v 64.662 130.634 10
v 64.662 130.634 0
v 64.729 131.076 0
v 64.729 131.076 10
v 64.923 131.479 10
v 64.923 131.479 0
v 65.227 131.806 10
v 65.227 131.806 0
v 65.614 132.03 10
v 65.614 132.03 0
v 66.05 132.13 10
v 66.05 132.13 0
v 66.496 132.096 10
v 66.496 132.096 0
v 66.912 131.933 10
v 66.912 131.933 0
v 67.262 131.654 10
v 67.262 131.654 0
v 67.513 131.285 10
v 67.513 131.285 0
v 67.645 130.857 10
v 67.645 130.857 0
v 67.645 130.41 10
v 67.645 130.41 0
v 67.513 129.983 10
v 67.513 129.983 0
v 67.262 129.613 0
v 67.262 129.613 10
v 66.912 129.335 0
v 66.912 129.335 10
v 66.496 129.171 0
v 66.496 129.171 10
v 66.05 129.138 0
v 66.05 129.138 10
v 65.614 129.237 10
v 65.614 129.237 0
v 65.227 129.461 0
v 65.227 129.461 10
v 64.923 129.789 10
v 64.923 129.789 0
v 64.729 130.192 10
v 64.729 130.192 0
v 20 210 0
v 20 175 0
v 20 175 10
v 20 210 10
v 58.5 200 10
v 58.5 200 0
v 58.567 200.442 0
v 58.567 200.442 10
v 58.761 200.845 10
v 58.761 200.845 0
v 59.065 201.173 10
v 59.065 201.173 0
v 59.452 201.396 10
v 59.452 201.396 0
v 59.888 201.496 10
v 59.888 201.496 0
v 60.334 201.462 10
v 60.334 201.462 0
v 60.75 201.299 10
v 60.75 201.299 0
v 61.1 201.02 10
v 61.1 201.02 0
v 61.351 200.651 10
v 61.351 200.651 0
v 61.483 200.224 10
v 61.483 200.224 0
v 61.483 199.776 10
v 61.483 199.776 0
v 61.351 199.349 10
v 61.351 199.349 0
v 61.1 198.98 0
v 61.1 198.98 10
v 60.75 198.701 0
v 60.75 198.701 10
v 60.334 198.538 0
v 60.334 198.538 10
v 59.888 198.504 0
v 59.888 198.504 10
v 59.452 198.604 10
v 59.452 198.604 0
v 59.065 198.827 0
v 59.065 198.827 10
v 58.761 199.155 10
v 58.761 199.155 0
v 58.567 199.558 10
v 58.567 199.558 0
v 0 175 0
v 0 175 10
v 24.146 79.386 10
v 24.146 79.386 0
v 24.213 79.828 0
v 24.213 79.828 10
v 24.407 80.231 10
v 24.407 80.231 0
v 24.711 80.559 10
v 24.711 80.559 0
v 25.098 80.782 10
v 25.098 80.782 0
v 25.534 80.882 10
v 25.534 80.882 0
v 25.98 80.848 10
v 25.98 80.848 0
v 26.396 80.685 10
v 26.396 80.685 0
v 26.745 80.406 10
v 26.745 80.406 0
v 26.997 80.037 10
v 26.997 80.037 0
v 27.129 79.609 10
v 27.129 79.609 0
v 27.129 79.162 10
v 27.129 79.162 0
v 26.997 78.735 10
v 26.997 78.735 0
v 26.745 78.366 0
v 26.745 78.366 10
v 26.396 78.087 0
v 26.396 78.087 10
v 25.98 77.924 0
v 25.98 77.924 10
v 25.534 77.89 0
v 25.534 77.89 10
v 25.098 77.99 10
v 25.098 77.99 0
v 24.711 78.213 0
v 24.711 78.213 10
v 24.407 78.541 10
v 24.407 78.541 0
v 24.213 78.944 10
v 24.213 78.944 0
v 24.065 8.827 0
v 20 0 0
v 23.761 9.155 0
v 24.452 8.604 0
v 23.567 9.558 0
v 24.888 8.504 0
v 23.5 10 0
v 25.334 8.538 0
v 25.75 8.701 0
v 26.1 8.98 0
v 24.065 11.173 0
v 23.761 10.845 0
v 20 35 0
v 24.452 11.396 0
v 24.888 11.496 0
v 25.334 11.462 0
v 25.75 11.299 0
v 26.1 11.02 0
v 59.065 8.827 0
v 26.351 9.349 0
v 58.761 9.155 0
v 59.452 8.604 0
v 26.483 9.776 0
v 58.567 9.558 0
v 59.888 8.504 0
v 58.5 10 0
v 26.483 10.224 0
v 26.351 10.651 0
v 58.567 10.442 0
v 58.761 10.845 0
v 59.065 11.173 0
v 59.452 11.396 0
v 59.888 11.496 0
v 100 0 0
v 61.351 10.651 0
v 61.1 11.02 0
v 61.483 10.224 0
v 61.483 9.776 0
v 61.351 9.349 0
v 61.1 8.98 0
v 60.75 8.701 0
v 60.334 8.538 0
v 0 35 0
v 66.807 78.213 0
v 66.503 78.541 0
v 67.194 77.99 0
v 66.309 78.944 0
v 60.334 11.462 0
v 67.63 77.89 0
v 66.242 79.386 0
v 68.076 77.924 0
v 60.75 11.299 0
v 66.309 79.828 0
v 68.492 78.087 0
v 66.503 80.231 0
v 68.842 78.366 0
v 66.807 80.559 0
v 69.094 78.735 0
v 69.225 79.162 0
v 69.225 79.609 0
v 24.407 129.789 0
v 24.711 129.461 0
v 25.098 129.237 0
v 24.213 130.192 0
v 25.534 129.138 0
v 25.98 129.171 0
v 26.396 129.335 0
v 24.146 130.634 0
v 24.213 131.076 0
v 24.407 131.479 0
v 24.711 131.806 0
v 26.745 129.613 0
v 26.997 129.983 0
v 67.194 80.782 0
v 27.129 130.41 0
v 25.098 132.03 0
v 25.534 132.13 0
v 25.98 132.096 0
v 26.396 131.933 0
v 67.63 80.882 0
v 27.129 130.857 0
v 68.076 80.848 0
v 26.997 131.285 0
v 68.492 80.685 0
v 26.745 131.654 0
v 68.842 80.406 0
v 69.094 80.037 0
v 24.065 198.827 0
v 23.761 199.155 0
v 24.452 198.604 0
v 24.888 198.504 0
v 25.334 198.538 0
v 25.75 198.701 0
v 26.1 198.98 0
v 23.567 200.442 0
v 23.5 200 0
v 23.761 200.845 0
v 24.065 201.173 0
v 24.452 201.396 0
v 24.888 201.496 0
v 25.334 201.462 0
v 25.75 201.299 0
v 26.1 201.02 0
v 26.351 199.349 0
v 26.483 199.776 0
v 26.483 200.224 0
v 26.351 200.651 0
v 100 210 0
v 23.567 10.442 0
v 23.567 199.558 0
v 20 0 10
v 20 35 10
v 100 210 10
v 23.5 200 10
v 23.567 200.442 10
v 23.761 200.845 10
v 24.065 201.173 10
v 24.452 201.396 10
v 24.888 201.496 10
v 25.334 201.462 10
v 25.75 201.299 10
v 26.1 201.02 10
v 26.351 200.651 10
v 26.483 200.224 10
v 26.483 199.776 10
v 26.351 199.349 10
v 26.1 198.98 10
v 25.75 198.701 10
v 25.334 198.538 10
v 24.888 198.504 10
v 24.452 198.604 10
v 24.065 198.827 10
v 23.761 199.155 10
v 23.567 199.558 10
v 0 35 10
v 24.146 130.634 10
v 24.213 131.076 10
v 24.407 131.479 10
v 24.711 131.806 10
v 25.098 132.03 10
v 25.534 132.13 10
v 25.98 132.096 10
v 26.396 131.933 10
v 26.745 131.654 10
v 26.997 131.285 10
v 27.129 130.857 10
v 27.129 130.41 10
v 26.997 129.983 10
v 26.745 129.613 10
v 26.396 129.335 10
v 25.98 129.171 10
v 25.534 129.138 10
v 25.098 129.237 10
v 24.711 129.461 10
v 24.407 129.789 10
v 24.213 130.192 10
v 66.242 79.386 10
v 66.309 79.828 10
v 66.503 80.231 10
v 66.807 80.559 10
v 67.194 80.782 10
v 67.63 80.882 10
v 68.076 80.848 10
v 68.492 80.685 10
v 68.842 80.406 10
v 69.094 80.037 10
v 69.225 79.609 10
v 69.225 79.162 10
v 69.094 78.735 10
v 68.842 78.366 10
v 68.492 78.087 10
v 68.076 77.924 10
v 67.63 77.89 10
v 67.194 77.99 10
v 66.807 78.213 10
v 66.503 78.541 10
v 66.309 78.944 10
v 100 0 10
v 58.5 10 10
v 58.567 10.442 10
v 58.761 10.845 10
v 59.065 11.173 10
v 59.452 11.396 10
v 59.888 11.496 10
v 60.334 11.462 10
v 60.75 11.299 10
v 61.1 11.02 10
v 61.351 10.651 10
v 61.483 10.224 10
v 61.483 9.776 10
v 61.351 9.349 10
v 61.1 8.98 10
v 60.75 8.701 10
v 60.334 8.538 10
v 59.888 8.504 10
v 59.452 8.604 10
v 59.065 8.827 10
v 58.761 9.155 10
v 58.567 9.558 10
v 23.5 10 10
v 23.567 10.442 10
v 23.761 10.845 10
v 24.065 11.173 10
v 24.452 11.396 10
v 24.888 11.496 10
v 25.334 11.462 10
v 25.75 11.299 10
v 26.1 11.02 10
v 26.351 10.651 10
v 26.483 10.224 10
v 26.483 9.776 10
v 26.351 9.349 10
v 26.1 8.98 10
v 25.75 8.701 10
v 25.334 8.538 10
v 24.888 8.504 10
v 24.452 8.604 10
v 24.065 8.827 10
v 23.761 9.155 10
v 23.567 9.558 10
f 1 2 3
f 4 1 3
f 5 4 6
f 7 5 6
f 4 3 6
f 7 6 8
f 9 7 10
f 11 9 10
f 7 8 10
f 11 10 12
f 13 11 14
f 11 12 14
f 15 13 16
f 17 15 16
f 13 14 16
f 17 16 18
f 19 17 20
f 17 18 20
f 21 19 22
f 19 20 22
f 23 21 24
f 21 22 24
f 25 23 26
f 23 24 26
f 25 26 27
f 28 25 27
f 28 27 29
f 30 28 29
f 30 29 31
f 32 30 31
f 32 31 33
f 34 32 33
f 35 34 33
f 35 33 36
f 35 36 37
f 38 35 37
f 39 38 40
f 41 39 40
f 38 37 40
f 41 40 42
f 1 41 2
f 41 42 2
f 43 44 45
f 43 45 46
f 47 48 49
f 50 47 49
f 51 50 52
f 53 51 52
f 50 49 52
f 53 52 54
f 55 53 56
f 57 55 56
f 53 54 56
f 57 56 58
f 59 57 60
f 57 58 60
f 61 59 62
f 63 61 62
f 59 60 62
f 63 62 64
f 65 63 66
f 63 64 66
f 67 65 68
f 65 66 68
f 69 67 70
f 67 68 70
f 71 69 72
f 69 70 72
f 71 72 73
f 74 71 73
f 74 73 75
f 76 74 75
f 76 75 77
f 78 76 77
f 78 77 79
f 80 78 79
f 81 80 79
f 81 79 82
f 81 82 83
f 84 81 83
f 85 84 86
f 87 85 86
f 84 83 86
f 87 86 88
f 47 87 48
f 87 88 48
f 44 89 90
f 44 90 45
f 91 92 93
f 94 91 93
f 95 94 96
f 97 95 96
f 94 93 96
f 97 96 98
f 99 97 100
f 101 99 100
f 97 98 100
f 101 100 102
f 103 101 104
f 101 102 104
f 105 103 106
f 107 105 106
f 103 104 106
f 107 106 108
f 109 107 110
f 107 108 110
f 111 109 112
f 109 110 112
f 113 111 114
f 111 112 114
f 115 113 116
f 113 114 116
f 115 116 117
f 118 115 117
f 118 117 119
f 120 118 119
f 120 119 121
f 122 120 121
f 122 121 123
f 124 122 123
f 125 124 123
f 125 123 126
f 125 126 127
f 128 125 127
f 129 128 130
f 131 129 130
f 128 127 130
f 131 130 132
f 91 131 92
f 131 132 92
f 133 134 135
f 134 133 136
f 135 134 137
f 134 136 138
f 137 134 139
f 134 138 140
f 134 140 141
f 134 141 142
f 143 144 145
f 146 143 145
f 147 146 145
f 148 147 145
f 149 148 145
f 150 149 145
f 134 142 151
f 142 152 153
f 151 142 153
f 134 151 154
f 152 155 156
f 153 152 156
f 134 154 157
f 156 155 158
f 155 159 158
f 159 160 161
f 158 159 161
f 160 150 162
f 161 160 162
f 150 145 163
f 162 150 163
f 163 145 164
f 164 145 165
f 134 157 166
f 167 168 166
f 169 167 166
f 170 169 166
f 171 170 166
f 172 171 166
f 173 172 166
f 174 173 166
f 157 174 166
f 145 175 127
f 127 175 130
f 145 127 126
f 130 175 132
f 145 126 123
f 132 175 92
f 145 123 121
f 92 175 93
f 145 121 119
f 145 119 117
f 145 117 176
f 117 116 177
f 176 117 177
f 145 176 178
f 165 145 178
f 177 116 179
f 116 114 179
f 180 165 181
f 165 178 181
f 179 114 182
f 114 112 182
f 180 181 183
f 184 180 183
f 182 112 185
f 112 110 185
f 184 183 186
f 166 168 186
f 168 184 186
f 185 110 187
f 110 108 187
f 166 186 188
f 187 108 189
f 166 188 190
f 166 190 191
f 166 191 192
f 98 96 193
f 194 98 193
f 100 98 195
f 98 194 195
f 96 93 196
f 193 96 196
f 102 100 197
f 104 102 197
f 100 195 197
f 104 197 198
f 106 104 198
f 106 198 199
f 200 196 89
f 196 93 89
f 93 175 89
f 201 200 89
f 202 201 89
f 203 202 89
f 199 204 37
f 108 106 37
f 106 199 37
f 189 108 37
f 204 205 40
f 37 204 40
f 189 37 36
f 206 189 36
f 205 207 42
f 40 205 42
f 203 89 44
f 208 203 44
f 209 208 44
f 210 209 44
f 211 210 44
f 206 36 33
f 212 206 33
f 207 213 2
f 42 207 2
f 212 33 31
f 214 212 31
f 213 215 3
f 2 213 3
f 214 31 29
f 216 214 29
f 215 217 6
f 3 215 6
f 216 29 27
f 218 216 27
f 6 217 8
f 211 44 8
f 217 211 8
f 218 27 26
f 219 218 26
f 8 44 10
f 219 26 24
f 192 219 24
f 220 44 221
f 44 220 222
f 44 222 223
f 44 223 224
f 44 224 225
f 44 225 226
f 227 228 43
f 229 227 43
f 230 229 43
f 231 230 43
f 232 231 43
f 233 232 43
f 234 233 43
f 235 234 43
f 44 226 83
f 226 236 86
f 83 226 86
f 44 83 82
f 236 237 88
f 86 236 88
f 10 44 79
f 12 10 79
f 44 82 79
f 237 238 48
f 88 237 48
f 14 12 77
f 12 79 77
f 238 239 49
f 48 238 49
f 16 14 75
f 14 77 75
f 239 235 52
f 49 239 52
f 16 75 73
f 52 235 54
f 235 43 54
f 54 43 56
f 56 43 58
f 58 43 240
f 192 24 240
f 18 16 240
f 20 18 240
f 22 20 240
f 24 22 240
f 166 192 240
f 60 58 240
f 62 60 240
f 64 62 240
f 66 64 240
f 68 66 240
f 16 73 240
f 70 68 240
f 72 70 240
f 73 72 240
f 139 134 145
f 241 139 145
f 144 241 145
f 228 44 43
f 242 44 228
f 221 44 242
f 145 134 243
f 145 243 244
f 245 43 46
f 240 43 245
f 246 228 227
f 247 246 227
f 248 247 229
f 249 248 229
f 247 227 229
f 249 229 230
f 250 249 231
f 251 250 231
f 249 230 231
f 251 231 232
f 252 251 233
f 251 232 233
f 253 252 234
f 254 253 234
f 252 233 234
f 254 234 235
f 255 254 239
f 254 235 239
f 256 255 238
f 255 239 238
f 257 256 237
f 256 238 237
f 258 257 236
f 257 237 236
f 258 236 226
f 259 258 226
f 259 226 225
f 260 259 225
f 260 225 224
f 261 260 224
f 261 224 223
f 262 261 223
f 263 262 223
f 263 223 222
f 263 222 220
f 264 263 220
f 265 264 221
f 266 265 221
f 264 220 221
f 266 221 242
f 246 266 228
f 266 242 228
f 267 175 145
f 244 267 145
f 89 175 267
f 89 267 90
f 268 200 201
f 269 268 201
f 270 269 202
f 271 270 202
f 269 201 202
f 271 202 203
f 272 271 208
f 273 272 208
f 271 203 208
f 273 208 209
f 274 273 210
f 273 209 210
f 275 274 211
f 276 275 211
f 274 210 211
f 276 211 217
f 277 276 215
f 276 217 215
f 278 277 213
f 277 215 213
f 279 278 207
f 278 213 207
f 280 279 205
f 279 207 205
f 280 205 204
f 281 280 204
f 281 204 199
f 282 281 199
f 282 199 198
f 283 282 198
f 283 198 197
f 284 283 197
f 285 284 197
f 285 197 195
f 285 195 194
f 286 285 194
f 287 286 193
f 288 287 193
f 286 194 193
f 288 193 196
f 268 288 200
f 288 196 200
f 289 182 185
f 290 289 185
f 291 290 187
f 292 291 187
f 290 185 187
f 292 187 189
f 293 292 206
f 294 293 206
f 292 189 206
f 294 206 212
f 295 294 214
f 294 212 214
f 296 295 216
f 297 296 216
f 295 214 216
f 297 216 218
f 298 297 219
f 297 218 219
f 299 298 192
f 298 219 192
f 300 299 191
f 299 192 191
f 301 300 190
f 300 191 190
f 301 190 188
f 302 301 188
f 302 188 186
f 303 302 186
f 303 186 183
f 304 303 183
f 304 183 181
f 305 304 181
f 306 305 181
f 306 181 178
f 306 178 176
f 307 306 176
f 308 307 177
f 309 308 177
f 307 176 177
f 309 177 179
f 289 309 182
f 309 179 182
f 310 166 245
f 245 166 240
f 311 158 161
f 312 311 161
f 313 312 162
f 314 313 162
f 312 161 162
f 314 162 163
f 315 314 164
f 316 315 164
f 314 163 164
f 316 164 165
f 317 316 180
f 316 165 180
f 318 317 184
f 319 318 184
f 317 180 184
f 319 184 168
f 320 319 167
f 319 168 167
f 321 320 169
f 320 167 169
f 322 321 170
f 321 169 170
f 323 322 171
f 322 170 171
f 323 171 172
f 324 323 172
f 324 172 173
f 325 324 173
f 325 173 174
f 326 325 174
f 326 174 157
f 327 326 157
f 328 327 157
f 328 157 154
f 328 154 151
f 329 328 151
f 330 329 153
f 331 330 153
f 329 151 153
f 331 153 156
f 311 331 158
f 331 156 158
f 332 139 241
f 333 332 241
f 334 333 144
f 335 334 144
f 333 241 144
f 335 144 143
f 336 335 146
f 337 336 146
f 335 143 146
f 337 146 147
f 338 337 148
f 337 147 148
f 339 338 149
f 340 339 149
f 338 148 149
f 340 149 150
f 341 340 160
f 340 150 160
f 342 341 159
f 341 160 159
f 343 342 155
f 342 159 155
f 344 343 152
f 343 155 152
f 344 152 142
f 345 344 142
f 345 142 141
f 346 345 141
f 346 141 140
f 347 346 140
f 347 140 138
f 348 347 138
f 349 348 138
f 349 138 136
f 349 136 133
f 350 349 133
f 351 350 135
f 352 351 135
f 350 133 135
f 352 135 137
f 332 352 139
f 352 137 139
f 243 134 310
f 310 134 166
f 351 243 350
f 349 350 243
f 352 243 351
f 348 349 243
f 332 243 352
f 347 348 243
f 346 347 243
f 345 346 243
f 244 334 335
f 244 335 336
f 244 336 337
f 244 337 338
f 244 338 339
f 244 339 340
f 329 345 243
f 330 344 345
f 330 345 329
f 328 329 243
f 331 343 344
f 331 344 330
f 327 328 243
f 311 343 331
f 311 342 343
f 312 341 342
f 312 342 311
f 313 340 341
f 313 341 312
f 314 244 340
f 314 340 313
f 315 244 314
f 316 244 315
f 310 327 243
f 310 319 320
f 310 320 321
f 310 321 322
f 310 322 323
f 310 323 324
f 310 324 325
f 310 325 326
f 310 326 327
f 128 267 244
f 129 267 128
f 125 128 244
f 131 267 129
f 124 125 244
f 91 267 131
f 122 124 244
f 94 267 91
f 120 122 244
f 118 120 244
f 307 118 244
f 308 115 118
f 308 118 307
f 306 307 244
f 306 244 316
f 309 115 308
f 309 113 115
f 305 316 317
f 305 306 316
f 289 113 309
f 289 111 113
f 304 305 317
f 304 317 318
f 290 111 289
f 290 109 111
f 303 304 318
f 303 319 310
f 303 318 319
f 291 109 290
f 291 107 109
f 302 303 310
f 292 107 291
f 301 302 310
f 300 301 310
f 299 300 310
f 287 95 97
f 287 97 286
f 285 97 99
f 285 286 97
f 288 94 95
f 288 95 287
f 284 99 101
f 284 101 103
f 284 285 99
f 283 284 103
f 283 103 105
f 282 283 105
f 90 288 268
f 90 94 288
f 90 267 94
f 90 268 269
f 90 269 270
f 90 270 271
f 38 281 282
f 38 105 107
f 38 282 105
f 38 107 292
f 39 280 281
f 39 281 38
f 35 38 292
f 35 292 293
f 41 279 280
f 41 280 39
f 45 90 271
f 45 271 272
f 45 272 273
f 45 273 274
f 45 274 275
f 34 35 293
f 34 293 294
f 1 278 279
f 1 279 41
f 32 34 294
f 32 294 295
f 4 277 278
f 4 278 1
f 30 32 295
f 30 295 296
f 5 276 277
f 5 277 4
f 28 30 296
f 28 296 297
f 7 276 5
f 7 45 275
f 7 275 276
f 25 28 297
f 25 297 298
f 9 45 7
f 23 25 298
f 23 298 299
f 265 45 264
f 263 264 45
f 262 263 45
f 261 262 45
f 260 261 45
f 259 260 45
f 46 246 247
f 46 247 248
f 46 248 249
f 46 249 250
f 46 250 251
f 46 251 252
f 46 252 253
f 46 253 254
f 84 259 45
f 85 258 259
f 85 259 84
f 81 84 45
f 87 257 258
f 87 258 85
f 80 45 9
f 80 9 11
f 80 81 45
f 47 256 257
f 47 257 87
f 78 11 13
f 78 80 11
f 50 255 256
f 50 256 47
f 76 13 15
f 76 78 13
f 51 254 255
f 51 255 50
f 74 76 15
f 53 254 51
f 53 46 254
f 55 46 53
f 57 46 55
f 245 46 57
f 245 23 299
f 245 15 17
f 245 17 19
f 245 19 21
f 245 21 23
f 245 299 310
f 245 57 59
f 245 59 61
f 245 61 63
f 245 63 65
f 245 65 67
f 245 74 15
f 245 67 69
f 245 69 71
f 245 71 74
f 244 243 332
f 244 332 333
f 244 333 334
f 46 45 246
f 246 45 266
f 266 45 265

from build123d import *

# Parameters (mm, degrees)
ESQUISSE2_W             = 100
ESQUISSE2_H             = 210
BOSS_EXTRU_1_DEPTH      = 10
ESQUISSE3_W             = 20
ESQUISSE3_H             = 35
ENL_V_MAT_EXTRU_1_DEPTH = 10
ESQUISSE4_R             = 1.5
ENL_V_MAT_EXTRU_2_DEPTH = 10
ESQUISSE6_R             = 1.5
ENL_V_MAT_EXTRU_3_DEPTH = 10


with BuildPart() as part:
    # Esquisse2 → Boss.-Extru.1 (new body)
    with BuildSketch(Plane.XY):
        with Locations((50, 105)):
            Rectangle(ESQUISSE2_W, ESQUISSE2_H)
    extrude(amount=BOSS_EXTRU_1_DEPTH)

    # Esquisse3 → Enlèv. mat.-Extru.1 (cut)
    with BuildSketch(Plane.XY):
        with Locations((10, 192.5)):
            Rectangle(ESQUISSE3_W, ESQUISSE3_H)
        with Locations((10, 17.5)):
            Rectangle(ESQUISSE3_W, ESQUISSE3_H)
    extrude(amount=ENL_V_MAT_EXTRU_1_DEPTH, mode=Mode.SUBTRACT)

    # Esquisse4 → Enlèv. mat.-Extru.2 (cut)
    with BuildSketch(Plane(origin=(0, 0, 0), x_dir=(-1, 0, 0), z_dir=(0, 0, -1))):
        with Locations((-25, 200)):
            Circle(ESQUISSE4_R)
        with Locations((-60, 200)):
            Circle(ESQUISSE4_R)
        with Locations((-25, 10)):
            Circle(ESQUISSE4_R)
        with Locations((-60, 10)):
            Circle(ESQUISSE4_R)
    extrude(amount=-ENL_V_MAT_EXTRU_2_DEPTH, mode=Mode.SUBTRACT)

    # Esquisse6 → Enlèv. mat.-Extru.3 (cut)
    with BuildSketch(Plane(origin=(0, 0, 0), x_dir=(-1, 0, 0), z_dir=(0, 0, -1))):
        with Locations((-25.645889501, 130.633743079)):
            Circle(ESQUISSE6_R)
        with Locations((-25.645889501, 79.385925673)):
            Circle(ESQUISSE6_R)
        with Locations((-67.742251285, 79.385925673)):
            Circle(ESQUISSE6_R)
        with Locations((-66.161997433, 130.633743079)):
            Circle(ESQUISSE6_R)
    extrude(amount=-ENL_V_MAT_EXTRU_3_DEPTH, mode=Mode.SUBTRACT)


solid = part.part
